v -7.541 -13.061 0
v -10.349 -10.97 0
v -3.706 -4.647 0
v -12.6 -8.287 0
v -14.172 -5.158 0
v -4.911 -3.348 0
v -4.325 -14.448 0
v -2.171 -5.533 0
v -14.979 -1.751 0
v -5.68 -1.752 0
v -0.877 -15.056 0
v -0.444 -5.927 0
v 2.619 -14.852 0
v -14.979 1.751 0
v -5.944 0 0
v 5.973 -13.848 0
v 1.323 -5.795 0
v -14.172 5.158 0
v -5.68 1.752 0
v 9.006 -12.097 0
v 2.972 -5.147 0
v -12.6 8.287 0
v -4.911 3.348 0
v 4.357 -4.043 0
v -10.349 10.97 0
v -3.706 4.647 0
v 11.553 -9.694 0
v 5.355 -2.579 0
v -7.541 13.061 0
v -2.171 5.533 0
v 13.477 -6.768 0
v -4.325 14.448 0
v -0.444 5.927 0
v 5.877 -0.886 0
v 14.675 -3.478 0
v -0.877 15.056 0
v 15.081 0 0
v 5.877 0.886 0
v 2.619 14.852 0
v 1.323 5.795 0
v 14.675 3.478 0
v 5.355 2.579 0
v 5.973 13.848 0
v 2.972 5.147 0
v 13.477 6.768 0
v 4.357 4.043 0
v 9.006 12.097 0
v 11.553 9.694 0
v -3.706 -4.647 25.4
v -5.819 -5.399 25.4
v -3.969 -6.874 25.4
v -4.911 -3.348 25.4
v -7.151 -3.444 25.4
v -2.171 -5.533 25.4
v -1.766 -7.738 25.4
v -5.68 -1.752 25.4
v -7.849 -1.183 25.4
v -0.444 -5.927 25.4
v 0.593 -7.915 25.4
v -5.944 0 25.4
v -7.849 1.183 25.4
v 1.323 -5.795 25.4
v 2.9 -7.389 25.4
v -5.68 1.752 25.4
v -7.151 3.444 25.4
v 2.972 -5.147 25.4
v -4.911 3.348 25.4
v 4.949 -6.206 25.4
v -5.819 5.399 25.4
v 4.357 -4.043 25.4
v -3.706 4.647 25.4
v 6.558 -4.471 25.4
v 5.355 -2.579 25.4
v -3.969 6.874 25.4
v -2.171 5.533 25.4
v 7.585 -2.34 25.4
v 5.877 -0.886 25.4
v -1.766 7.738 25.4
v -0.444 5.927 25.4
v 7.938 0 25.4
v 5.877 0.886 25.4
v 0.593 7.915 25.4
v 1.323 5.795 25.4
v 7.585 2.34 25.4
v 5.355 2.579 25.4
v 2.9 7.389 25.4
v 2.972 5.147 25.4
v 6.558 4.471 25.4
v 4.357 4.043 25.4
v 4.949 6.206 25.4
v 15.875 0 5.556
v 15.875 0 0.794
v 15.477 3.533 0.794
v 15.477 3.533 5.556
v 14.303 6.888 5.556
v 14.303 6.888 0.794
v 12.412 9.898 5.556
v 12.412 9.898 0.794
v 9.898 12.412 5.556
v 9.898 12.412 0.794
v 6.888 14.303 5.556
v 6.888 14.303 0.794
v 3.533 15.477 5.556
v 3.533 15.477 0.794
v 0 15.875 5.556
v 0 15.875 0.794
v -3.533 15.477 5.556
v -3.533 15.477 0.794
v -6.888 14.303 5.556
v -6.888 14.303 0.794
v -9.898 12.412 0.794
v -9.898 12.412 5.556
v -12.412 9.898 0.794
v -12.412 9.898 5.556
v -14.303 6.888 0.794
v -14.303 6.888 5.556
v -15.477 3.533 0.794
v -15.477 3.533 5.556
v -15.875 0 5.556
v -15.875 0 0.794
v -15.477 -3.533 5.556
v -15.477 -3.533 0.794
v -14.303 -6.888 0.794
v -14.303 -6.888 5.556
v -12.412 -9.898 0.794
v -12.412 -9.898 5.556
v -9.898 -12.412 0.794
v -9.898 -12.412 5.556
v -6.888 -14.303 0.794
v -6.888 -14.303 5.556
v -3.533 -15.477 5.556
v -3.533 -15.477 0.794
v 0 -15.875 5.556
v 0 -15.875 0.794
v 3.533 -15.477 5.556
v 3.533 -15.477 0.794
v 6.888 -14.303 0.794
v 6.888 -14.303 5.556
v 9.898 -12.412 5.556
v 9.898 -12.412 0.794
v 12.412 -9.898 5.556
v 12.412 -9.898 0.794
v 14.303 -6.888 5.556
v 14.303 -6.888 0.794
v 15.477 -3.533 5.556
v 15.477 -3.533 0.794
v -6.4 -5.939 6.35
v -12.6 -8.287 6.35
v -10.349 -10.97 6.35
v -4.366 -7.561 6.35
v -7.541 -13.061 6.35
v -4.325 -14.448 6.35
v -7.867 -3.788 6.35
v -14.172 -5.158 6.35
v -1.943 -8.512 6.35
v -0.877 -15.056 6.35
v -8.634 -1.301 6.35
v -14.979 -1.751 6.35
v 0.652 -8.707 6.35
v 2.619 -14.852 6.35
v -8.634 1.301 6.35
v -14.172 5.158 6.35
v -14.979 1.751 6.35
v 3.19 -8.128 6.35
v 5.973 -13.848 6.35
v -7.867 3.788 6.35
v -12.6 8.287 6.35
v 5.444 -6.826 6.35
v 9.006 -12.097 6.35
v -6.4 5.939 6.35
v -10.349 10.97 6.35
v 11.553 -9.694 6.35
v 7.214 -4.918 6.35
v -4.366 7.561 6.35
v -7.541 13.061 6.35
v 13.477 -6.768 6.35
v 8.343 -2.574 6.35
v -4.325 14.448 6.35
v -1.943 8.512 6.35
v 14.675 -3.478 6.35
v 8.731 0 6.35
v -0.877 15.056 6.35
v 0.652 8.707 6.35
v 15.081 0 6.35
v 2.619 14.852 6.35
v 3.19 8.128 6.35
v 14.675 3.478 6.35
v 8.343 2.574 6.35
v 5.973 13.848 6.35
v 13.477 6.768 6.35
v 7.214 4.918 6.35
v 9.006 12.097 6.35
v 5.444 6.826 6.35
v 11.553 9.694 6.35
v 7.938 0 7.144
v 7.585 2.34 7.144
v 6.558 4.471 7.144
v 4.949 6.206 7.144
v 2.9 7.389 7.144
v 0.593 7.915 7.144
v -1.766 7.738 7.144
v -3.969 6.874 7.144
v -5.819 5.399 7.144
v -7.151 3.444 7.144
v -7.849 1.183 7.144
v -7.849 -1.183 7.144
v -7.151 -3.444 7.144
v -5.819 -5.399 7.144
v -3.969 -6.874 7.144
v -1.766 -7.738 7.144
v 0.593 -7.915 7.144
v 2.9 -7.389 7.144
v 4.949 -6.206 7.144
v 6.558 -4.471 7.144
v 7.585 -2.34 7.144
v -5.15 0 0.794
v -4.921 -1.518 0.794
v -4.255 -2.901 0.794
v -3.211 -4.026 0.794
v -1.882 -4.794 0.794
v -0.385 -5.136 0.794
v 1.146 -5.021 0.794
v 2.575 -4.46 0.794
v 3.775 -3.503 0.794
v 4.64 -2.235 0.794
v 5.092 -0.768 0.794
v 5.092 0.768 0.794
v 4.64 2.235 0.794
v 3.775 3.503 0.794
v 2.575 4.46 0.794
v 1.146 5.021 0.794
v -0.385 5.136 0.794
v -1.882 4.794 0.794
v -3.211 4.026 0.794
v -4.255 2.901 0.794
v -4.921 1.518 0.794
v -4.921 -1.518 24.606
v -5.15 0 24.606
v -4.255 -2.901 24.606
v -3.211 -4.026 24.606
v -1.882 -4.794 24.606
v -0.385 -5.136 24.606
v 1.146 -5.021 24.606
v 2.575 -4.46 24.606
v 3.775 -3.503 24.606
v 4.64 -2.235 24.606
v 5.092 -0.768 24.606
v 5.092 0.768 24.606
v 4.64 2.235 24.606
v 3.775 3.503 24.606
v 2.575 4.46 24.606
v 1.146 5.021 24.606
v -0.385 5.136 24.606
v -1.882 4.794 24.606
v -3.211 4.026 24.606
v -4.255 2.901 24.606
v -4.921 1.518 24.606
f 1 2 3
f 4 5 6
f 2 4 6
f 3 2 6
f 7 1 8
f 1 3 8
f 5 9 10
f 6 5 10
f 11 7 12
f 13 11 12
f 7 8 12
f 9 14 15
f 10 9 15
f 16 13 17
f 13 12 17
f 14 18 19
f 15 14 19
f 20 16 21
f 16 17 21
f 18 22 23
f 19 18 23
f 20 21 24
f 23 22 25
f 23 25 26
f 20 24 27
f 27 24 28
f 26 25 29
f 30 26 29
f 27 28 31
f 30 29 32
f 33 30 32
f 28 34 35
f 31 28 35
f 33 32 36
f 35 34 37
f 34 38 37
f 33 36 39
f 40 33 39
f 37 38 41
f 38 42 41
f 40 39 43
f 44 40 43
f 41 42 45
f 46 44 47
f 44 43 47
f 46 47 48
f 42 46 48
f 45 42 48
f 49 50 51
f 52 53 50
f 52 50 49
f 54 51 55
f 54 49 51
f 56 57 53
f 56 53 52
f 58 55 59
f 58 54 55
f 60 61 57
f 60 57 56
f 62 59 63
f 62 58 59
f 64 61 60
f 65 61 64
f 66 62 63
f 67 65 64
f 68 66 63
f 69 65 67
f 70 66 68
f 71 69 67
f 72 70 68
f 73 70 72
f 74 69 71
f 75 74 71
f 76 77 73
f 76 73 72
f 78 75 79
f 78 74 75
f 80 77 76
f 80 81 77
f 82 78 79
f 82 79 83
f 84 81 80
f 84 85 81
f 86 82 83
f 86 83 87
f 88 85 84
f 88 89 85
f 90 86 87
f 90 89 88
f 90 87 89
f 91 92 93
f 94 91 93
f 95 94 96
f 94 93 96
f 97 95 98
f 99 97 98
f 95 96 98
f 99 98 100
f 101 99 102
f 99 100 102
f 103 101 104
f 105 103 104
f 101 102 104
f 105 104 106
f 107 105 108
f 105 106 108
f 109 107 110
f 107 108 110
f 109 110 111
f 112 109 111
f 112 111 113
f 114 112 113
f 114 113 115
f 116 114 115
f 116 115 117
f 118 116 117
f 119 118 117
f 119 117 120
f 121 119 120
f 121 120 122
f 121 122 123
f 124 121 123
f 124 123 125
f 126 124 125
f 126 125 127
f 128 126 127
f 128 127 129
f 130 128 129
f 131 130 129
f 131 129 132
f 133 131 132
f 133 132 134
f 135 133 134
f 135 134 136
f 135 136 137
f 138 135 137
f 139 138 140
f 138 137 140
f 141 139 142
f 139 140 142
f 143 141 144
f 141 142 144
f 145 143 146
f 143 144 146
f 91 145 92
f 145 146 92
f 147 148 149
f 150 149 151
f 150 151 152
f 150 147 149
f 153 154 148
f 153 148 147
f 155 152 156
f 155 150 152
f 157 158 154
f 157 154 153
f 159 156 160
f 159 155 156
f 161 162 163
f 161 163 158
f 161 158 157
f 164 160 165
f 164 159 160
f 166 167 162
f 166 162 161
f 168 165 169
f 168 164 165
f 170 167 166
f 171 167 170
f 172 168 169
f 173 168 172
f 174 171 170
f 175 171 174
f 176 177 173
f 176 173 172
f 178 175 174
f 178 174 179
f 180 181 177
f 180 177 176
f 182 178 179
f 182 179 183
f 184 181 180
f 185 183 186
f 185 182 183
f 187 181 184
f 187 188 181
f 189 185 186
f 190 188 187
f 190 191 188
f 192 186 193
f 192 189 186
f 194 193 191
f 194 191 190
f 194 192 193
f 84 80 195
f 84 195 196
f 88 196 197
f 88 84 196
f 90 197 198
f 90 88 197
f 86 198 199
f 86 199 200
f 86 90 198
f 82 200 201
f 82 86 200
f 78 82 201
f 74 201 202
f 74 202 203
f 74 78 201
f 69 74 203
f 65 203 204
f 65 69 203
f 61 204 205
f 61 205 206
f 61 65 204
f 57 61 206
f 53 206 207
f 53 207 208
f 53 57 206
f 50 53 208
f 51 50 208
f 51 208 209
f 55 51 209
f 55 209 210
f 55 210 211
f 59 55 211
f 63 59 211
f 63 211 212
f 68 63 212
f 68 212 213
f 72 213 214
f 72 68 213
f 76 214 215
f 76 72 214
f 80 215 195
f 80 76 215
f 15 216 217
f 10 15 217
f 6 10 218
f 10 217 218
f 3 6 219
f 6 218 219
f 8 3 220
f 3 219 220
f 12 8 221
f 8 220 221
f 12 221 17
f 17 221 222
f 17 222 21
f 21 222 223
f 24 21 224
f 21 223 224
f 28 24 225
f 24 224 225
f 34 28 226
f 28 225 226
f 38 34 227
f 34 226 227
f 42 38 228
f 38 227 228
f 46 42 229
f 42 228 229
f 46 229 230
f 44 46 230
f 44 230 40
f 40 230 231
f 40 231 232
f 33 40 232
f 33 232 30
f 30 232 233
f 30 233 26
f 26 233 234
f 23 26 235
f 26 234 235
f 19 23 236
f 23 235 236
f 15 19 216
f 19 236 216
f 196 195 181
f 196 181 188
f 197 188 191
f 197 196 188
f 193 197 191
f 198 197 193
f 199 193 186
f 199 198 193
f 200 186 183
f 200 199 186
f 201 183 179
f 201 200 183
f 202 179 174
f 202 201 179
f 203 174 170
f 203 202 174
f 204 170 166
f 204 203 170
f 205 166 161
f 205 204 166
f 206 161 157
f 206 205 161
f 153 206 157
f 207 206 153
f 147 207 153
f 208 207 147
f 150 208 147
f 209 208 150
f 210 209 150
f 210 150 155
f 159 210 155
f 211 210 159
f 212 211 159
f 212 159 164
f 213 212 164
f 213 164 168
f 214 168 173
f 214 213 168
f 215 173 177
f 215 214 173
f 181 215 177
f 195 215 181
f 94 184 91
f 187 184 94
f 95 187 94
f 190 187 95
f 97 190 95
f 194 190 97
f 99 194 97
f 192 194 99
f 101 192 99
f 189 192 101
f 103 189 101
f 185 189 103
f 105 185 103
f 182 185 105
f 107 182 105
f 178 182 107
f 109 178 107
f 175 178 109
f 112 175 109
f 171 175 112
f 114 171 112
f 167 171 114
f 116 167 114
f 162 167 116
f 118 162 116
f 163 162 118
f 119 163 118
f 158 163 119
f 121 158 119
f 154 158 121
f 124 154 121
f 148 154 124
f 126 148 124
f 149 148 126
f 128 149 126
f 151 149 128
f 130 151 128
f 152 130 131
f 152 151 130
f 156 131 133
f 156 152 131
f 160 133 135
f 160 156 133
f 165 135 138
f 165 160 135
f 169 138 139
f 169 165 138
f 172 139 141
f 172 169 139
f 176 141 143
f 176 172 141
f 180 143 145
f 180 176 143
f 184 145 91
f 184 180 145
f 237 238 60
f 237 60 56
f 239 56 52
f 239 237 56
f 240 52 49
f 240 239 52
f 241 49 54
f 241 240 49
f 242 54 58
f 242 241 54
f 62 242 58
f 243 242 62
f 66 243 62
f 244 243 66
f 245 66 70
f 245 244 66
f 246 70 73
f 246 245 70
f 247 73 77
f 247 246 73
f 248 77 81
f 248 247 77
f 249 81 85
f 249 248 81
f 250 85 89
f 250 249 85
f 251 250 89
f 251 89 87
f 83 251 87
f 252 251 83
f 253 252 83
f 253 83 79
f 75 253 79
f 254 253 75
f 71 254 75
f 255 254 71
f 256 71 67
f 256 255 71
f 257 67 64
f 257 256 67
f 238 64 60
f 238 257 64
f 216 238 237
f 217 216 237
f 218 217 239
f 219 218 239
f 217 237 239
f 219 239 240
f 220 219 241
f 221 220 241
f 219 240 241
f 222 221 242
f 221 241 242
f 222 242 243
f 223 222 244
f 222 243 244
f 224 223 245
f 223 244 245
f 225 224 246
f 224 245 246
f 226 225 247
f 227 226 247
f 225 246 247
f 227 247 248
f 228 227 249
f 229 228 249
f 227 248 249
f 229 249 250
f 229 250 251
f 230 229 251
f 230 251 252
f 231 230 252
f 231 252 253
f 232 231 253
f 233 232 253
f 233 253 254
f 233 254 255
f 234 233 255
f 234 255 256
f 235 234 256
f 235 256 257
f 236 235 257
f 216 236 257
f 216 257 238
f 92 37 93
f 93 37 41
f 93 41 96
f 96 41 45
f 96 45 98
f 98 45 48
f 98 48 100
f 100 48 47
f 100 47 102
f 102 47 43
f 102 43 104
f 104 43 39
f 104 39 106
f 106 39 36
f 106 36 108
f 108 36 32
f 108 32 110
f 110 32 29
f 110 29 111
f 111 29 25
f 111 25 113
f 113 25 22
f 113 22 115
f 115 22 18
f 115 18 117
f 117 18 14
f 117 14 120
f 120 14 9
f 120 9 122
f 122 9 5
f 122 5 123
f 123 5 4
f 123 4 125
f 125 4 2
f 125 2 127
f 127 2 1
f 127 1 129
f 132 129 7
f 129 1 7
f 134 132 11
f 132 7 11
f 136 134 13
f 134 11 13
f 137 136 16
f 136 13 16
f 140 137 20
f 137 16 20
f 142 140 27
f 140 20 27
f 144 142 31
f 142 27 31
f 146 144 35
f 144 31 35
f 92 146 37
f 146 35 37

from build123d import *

# Parameters (mm, degrees)
F0_R     = 15.875
F1_DEPTH = 25.4
F2_D     = 10.3
F3_SIZE  = 0.79375
F4_SIZE  = 0.79375
F5_R     = 15.875
F5_R_2   = 7.9375
F6_DEPTH = 19.05
F7_SIZE  = 0.79375


with BuildPart() as f1:
    # F0 (on Top) → F1 (new body)
    with BuildSketch(Plane.XY):
        Circle(F0_R)
    extrude(amount=F1_DEPTH)

    # F2 (through all)
    with Locations(Plane(origin=(0, 0, 0), x_dir=(1, 0, 0), z_dir=(0, 0, -1))):
        with Locations((0, 0)):
            Hole(F2_D / 2)

    # F3
    f3_edges = [f1.edges().sort_by_distance(p)[0] for p in [
        (-15.875, 0, 0),
    ]]
    chamfer(f3_edges, length=F3_SIZE)

    # F4
    f4_edges = [f1.edges().sort_by_distance(p)[0] for p in [
        (-15.875, 0, 25.4),
        (-5.15, 0, 25.4),
        (-5.15, 0, 0),
    ]]
    chamfer(f4_edges, length=F4_SIZE)

    # F5 (on face) → F6 (cut)
    with BuildSketch(Plane.XY.offset(25.4)):
        Circle(F5_R)
        Circle(F5_R_2, mode=Mode.SUBTRACT)
    extrude(amount=-F6_DEPTH, mode=Mode.SUBTRACT)

    # F7
    f7_edges = [f1.edges().sort_by_distance(p)[0] for p in [
        (-15.875, 0, 6.35),
        (-7.9375, 0, 6.35),
    ]]
    chamfer(f7_edges, length=F7_SIZE)


solid = f1.part
